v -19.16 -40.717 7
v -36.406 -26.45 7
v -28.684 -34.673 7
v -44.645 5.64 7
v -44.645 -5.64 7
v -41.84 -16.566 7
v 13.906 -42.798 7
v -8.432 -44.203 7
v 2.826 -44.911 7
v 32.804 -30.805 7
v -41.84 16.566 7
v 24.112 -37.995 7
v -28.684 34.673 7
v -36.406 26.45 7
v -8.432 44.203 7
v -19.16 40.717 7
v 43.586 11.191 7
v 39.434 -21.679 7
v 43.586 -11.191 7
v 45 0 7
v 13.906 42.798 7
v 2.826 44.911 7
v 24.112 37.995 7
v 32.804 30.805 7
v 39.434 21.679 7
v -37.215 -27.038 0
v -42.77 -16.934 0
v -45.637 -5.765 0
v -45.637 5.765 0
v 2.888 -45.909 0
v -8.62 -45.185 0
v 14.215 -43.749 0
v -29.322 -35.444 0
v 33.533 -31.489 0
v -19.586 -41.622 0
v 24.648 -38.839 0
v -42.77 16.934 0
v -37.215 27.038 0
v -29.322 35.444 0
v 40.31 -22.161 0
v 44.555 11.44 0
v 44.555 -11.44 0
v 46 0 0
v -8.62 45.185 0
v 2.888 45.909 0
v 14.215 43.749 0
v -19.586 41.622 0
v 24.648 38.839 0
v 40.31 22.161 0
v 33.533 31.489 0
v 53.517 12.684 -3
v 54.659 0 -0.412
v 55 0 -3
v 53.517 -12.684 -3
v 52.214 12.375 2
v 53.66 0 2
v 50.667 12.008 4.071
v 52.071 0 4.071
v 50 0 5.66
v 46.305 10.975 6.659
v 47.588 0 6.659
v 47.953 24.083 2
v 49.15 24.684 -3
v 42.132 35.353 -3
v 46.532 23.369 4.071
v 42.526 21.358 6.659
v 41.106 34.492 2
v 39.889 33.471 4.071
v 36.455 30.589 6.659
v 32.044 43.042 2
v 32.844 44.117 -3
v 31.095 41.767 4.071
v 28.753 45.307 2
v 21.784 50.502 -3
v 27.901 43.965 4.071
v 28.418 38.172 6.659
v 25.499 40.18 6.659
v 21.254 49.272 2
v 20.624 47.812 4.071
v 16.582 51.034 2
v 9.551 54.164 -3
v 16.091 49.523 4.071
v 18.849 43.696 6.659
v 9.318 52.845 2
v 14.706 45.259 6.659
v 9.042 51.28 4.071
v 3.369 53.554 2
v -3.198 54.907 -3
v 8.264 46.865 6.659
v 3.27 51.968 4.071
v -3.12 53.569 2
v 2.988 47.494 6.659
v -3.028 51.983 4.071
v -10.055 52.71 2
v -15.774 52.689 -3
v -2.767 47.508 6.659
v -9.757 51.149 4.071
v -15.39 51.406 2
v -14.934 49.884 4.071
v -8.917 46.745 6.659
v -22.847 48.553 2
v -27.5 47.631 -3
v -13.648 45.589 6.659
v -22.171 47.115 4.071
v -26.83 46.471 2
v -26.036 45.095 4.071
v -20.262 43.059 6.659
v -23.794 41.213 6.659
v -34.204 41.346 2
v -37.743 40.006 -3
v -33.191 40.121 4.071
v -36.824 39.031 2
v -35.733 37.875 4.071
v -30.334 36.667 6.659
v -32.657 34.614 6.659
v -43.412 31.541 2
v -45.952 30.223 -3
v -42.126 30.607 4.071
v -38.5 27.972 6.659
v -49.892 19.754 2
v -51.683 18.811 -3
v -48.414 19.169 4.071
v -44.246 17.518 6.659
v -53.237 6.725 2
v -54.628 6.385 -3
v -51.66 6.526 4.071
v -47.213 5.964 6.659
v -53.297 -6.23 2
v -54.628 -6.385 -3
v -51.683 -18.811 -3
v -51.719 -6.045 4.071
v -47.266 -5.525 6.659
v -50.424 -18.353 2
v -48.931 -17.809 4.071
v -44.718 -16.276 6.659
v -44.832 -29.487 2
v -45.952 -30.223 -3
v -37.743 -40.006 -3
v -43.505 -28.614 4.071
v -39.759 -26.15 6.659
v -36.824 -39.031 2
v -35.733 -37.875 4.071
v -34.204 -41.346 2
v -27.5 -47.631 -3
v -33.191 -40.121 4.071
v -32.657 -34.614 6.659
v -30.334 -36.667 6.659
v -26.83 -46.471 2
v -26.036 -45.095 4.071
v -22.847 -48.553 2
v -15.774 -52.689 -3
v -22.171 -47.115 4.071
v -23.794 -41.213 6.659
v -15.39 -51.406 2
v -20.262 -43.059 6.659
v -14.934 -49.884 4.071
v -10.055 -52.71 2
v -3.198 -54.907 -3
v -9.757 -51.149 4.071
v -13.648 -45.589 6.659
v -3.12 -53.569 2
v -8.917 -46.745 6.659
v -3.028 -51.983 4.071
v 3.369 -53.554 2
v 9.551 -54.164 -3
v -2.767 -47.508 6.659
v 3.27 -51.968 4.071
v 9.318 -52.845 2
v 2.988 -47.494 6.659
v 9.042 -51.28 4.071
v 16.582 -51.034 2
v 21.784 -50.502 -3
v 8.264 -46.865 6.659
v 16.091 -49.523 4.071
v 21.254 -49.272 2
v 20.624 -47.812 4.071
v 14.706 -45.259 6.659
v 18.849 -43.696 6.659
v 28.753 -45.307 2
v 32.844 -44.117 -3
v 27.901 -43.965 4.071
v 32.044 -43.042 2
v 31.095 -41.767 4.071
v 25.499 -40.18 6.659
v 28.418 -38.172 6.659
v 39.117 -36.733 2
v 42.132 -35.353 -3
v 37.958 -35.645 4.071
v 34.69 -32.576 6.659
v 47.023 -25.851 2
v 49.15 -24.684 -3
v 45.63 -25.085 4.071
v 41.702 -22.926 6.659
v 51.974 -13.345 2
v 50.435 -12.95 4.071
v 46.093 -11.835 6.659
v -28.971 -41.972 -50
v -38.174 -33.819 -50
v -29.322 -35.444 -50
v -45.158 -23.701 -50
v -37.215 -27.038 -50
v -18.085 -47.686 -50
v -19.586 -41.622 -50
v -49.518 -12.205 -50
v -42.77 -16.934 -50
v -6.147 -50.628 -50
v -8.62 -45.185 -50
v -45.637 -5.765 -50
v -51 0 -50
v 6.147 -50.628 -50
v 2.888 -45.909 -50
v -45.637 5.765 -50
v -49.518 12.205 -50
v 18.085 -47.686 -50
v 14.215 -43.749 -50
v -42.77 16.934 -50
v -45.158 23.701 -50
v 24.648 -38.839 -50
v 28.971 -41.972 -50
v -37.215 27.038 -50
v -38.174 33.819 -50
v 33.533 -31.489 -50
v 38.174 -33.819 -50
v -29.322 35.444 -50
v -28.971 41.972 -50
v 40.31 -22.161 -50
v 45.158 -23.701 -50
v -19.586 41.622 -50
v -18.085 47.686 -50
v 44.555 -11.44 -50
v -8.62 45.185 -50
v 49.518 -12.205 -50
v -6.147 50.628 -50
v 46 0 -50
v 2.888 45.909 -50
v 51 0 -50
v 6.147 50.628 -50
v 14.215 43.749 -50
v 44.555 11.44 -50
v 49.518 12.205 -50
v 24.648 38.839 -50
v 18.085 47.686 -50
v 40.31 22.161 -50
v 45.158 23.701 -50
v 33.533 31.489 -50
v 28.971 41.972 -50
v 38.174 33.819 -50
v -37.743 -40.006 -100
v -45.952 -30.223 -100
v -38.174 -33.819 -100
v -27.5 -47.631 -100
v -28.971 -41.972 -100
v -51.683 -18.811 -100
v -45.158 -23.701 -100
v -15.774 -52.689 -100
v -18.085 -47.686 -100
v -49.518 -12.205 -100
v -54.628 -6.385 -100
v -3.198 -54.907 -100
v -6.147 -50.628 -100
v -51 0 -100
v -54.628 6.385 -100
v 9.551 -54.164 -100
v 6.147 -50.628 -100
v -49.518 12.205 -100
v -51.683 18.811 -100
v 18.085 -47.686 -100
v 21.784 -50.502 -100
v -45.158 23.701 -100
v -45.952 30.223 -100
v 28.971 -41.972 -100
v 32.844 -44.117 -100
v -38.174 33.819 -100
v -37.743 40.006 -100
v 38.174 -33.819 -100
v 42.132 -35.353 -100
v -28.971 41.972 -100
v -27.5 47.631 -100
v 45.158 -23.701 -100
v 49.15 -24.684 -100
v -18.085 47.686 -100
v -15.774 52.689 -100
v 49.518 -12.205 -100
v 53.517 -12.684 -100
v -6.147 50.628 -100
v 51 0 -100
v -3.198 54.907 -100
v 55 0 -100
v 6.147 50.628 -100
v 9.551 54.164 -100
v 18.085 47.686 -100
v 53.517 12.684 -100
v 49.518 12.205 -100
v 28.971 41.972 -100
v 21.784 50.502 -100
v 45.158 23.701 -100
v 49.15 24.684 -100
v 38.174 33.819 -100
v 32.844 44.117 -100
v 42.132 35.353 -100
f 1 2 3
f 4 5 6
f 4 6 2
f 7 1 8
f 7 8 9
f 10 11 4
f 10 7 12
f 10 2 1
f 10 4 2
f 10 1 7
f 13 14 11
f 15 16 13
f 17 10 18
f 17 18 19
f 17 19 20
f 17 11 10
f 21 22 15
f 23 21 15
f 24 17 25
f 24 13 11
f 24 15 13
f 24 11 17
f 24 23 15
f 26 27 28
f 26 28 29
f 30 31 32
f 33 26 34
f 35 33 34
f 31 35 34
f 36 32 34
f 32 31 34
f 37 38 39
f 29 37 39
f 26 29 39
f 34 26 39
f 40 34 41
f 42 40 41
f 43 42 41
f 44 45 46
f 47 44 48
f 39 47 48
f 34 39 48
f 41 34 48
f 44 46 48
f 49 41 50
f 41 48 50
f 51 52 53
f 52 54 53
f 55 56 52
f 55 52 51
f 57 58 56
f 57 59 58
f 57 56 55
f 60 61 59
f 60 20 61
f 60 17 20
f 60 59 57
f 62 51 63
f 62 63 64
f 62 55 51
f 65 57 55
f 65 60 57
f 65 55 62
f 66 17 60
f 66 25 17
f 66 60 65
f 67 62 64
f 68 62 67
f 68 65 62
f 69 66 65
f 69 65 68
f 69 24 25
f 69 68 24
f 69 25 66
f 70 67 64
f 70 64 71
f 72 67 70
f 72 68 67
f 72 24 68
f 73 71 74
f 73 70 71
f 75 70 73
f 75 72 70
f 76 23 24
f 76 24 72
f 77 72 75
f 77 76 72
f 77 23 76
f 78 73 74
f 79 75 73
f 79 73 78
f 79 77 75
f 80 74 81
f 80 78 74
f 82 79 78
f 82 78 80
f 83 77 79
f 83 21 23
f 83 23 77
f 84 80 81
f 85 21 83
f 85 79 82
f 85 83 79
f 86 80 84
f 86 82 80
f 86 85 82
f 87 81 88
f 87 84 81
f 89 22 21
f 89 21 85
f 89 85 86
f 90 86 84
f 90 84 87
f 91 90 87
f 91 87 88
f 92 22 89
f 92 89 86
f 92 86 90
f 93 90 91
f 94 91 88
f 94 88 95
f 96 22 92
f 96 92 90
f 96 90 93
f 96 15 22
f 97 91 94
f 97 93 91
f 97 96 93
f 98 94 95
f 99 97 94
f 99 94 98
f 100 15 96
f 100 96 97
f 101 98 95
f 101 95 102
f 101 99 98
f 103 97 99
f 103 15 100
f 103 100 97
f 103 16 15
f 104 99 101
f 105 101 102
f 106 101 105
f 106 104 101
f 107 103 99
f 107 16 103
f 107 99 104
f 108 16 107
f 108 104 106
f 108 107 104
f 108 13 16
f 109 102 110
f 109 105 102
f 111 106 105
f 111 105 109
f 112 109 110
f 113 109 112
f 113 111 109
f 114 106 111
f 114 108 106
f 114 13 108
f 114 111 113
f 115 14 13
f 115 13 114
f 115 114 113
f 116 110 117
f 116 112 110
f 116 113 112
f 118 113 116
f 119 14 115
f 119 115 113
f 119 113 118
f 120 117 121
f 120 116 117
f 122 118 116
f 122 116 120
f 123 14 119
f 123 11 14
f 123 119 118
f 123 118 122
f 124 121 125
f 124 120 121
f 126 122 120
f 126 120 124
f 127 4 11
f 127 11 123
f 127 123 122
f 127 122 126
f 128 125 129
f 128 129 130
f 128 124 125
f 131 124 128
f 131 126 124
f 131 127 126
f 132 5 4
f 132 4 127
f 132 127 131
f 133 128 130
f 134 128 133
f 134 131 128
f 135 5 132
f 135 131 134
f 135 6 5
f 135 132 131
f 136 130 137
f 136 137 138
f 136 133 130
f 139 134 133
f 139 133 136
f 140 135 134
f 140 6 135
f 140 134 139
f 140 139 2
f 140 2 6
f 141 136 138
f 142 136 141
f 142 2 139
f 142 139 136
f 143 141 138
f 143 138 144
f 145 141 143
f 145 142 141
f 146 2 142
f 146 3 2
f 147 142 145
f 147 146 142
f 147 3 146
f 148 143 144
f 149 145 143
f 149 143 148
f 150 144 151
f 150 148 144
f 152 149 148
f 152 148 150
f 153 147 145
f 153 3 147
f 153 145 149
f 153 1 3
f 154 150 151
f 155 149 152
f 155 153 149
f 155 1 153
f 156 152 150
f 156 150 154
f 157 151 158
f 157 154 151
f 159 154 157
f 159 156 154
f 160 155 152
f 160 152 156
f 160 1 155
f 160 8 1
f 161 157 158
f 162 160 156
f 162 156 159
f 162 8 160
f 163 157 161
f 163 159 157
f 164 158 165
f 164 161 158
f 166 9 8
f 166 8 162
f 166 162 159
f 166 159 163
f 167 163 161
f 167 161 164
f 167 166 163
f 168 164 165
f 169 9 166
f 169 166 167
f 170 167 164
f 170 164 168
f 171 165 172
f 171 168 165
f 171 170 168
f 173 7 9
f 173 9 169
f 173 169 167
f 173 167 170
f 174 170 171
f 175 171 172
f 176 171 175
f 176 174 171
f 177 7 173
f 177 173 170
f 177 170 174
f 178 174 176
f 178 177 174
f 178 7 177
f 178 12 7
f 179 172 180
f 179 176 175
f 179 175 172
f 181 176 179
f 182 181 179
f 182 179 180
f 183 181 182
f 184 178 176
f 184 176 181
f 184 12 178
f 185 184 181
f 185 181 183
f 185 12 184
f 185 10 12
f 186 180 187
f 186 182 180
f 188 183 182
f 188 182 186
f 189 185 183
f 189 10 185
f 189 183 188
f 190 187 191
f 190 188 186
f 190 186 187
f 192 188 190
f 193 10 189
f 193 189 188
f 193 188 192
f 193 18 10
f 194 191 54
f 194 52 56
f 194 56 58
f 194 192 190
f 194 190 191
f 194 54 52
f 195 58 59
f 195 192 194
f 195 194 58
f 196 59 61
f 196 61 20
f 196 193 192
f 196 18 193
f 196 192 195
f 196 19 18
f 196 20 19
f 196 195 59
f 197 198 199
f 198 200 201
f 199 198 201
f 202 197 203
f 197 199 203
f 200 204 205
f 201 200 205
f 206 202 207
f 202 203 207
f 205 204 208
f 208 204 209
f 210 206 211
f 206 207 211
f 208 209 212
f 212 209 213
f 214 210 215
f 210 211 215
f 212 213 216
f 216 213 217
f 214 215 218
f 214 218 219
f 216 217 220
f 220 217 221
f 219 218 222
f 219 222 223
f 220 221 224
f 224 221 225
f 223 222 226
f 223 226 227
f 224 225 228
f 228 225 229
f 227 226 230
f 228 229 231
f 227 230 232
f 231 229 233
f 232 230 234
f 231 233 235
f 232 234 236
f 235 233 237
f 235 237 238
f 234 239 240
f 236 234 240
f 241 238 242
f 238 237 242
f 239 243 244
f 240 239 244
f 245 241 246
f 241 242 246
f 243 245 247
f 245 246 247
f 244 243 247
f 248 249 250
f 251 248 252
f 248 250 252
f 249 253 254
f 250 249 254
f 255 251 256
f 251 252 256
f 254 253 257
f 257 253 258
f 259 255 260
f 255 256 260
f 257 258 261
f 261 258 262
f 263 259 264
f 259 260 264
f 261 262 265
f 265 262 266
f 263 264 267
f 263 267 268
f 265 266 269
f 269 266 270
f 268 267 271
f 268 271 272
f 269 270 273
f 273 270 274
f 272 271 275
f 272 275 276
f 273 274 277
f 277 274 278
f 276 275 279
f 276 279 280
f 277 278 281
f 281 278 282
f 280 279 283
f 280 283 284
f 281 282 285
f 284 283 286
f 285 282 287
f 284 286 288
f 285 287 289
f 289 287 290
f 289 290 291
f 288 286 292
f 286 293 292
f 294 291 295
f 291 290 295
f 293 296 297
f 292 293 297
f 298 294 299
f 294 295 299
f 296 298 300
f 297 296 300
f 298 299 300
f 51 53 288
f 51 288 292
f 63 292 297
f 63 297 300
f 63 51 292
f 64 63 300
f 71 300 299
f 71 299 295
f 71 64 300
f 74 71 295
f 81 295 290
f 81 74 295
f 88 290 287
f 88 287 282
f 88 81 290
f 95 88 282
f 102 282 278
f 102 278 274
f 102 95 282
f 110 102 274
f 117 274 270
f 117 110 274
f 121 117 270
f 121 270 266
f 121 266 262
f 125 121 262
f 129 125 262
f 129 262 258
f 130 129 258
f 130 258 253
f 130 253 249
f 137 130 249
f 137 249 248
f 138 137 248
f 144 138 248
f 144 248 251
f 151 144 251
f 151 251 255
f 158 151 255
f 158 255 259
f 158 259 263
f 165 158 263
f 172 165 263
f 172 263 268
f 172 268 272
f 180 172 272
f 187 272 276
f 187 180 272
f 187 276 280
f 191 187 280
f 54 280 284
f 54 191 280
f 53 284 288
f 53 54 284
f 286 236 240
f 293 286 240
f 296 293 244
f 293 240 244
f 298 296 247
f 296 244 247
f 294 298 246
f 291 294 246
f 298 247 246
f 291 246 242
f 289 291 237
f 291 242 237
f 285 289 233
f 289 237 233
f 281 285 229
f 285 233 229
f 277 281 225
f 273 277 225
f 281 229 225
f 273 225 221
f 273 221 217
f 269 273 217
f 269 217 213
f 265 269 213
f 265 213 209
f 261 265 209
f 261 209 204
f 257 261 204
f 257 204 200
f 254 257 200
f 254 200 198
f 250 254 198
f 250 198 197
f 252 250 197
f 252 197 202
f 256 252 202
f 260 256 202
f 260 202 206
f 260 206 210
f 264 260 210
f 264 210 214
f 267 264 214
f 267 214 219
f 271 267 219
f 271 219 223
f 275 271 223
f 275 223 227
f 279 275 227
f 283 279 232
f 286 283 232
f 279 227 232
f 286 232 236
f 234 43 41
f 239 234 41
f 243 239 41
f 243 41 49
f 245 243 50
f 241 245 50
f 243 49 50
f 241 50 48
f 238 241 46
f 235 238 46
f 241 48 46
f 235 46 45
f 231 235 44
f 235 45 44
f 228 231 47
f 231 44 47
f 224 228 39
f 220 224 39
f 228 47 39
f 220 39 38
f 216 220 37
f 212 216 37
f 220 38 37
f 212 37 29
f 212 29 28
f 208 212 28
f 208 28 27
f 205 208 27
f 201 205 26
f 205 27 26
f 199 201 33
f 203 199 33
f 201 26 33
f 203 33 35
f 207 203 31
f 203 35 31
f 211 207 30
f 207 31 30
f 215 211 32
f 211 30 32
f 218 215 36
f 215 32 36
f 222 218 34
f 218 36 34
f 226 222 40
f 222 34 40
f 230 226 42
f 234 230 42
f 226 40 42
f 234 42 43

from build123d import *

# Parameters (mm, degrees)
F0_R     = 55
F0_R_2   = 51
F0_R_3   = 46
F1_DEPTH = 7
F2_DEPTH = 50
F3_DEPTH = 100
F4_R     = 10


with BuildPart() as f1:
    # F0 (on Top) → F1 (new body)
    with BuildSketch(Plane.XY):
        Circle(F0_R)
        Circle(F0_R_2, mode=Mode.SUBTRACT)
        Circle(F0_R_2)
        Circle(F0_R_3, mode=Mode.SUBTRACT)
        Circle(F0_R_3)
    extrude(amount=F1_DEPTH)

    # F0 (on Top) → F2 (join)
    with BuildSketch(Plane.XY):
        Circle(F0_R_2)
        Circle(F0_R_3, mode=Mode.SUBTRACT)
    extrude(amount=-F2_DEPTH)

    # F0 (on Top) → F3 (join)
    with BuildSketch(Plane.XY):
        Circle(F0_R)
        Circle(F0_R_2, mode=Mode.SUBTRACT)
    extrude(amount=-F3_DEPTH)

    # F4
    f4_edges = [f1.edges().sort_by_distance(p)[0] for p in [
        (-55, 0, 7),
    ]]
    fillet(f4_edges, radius=F4_R)


solid = f1.part
